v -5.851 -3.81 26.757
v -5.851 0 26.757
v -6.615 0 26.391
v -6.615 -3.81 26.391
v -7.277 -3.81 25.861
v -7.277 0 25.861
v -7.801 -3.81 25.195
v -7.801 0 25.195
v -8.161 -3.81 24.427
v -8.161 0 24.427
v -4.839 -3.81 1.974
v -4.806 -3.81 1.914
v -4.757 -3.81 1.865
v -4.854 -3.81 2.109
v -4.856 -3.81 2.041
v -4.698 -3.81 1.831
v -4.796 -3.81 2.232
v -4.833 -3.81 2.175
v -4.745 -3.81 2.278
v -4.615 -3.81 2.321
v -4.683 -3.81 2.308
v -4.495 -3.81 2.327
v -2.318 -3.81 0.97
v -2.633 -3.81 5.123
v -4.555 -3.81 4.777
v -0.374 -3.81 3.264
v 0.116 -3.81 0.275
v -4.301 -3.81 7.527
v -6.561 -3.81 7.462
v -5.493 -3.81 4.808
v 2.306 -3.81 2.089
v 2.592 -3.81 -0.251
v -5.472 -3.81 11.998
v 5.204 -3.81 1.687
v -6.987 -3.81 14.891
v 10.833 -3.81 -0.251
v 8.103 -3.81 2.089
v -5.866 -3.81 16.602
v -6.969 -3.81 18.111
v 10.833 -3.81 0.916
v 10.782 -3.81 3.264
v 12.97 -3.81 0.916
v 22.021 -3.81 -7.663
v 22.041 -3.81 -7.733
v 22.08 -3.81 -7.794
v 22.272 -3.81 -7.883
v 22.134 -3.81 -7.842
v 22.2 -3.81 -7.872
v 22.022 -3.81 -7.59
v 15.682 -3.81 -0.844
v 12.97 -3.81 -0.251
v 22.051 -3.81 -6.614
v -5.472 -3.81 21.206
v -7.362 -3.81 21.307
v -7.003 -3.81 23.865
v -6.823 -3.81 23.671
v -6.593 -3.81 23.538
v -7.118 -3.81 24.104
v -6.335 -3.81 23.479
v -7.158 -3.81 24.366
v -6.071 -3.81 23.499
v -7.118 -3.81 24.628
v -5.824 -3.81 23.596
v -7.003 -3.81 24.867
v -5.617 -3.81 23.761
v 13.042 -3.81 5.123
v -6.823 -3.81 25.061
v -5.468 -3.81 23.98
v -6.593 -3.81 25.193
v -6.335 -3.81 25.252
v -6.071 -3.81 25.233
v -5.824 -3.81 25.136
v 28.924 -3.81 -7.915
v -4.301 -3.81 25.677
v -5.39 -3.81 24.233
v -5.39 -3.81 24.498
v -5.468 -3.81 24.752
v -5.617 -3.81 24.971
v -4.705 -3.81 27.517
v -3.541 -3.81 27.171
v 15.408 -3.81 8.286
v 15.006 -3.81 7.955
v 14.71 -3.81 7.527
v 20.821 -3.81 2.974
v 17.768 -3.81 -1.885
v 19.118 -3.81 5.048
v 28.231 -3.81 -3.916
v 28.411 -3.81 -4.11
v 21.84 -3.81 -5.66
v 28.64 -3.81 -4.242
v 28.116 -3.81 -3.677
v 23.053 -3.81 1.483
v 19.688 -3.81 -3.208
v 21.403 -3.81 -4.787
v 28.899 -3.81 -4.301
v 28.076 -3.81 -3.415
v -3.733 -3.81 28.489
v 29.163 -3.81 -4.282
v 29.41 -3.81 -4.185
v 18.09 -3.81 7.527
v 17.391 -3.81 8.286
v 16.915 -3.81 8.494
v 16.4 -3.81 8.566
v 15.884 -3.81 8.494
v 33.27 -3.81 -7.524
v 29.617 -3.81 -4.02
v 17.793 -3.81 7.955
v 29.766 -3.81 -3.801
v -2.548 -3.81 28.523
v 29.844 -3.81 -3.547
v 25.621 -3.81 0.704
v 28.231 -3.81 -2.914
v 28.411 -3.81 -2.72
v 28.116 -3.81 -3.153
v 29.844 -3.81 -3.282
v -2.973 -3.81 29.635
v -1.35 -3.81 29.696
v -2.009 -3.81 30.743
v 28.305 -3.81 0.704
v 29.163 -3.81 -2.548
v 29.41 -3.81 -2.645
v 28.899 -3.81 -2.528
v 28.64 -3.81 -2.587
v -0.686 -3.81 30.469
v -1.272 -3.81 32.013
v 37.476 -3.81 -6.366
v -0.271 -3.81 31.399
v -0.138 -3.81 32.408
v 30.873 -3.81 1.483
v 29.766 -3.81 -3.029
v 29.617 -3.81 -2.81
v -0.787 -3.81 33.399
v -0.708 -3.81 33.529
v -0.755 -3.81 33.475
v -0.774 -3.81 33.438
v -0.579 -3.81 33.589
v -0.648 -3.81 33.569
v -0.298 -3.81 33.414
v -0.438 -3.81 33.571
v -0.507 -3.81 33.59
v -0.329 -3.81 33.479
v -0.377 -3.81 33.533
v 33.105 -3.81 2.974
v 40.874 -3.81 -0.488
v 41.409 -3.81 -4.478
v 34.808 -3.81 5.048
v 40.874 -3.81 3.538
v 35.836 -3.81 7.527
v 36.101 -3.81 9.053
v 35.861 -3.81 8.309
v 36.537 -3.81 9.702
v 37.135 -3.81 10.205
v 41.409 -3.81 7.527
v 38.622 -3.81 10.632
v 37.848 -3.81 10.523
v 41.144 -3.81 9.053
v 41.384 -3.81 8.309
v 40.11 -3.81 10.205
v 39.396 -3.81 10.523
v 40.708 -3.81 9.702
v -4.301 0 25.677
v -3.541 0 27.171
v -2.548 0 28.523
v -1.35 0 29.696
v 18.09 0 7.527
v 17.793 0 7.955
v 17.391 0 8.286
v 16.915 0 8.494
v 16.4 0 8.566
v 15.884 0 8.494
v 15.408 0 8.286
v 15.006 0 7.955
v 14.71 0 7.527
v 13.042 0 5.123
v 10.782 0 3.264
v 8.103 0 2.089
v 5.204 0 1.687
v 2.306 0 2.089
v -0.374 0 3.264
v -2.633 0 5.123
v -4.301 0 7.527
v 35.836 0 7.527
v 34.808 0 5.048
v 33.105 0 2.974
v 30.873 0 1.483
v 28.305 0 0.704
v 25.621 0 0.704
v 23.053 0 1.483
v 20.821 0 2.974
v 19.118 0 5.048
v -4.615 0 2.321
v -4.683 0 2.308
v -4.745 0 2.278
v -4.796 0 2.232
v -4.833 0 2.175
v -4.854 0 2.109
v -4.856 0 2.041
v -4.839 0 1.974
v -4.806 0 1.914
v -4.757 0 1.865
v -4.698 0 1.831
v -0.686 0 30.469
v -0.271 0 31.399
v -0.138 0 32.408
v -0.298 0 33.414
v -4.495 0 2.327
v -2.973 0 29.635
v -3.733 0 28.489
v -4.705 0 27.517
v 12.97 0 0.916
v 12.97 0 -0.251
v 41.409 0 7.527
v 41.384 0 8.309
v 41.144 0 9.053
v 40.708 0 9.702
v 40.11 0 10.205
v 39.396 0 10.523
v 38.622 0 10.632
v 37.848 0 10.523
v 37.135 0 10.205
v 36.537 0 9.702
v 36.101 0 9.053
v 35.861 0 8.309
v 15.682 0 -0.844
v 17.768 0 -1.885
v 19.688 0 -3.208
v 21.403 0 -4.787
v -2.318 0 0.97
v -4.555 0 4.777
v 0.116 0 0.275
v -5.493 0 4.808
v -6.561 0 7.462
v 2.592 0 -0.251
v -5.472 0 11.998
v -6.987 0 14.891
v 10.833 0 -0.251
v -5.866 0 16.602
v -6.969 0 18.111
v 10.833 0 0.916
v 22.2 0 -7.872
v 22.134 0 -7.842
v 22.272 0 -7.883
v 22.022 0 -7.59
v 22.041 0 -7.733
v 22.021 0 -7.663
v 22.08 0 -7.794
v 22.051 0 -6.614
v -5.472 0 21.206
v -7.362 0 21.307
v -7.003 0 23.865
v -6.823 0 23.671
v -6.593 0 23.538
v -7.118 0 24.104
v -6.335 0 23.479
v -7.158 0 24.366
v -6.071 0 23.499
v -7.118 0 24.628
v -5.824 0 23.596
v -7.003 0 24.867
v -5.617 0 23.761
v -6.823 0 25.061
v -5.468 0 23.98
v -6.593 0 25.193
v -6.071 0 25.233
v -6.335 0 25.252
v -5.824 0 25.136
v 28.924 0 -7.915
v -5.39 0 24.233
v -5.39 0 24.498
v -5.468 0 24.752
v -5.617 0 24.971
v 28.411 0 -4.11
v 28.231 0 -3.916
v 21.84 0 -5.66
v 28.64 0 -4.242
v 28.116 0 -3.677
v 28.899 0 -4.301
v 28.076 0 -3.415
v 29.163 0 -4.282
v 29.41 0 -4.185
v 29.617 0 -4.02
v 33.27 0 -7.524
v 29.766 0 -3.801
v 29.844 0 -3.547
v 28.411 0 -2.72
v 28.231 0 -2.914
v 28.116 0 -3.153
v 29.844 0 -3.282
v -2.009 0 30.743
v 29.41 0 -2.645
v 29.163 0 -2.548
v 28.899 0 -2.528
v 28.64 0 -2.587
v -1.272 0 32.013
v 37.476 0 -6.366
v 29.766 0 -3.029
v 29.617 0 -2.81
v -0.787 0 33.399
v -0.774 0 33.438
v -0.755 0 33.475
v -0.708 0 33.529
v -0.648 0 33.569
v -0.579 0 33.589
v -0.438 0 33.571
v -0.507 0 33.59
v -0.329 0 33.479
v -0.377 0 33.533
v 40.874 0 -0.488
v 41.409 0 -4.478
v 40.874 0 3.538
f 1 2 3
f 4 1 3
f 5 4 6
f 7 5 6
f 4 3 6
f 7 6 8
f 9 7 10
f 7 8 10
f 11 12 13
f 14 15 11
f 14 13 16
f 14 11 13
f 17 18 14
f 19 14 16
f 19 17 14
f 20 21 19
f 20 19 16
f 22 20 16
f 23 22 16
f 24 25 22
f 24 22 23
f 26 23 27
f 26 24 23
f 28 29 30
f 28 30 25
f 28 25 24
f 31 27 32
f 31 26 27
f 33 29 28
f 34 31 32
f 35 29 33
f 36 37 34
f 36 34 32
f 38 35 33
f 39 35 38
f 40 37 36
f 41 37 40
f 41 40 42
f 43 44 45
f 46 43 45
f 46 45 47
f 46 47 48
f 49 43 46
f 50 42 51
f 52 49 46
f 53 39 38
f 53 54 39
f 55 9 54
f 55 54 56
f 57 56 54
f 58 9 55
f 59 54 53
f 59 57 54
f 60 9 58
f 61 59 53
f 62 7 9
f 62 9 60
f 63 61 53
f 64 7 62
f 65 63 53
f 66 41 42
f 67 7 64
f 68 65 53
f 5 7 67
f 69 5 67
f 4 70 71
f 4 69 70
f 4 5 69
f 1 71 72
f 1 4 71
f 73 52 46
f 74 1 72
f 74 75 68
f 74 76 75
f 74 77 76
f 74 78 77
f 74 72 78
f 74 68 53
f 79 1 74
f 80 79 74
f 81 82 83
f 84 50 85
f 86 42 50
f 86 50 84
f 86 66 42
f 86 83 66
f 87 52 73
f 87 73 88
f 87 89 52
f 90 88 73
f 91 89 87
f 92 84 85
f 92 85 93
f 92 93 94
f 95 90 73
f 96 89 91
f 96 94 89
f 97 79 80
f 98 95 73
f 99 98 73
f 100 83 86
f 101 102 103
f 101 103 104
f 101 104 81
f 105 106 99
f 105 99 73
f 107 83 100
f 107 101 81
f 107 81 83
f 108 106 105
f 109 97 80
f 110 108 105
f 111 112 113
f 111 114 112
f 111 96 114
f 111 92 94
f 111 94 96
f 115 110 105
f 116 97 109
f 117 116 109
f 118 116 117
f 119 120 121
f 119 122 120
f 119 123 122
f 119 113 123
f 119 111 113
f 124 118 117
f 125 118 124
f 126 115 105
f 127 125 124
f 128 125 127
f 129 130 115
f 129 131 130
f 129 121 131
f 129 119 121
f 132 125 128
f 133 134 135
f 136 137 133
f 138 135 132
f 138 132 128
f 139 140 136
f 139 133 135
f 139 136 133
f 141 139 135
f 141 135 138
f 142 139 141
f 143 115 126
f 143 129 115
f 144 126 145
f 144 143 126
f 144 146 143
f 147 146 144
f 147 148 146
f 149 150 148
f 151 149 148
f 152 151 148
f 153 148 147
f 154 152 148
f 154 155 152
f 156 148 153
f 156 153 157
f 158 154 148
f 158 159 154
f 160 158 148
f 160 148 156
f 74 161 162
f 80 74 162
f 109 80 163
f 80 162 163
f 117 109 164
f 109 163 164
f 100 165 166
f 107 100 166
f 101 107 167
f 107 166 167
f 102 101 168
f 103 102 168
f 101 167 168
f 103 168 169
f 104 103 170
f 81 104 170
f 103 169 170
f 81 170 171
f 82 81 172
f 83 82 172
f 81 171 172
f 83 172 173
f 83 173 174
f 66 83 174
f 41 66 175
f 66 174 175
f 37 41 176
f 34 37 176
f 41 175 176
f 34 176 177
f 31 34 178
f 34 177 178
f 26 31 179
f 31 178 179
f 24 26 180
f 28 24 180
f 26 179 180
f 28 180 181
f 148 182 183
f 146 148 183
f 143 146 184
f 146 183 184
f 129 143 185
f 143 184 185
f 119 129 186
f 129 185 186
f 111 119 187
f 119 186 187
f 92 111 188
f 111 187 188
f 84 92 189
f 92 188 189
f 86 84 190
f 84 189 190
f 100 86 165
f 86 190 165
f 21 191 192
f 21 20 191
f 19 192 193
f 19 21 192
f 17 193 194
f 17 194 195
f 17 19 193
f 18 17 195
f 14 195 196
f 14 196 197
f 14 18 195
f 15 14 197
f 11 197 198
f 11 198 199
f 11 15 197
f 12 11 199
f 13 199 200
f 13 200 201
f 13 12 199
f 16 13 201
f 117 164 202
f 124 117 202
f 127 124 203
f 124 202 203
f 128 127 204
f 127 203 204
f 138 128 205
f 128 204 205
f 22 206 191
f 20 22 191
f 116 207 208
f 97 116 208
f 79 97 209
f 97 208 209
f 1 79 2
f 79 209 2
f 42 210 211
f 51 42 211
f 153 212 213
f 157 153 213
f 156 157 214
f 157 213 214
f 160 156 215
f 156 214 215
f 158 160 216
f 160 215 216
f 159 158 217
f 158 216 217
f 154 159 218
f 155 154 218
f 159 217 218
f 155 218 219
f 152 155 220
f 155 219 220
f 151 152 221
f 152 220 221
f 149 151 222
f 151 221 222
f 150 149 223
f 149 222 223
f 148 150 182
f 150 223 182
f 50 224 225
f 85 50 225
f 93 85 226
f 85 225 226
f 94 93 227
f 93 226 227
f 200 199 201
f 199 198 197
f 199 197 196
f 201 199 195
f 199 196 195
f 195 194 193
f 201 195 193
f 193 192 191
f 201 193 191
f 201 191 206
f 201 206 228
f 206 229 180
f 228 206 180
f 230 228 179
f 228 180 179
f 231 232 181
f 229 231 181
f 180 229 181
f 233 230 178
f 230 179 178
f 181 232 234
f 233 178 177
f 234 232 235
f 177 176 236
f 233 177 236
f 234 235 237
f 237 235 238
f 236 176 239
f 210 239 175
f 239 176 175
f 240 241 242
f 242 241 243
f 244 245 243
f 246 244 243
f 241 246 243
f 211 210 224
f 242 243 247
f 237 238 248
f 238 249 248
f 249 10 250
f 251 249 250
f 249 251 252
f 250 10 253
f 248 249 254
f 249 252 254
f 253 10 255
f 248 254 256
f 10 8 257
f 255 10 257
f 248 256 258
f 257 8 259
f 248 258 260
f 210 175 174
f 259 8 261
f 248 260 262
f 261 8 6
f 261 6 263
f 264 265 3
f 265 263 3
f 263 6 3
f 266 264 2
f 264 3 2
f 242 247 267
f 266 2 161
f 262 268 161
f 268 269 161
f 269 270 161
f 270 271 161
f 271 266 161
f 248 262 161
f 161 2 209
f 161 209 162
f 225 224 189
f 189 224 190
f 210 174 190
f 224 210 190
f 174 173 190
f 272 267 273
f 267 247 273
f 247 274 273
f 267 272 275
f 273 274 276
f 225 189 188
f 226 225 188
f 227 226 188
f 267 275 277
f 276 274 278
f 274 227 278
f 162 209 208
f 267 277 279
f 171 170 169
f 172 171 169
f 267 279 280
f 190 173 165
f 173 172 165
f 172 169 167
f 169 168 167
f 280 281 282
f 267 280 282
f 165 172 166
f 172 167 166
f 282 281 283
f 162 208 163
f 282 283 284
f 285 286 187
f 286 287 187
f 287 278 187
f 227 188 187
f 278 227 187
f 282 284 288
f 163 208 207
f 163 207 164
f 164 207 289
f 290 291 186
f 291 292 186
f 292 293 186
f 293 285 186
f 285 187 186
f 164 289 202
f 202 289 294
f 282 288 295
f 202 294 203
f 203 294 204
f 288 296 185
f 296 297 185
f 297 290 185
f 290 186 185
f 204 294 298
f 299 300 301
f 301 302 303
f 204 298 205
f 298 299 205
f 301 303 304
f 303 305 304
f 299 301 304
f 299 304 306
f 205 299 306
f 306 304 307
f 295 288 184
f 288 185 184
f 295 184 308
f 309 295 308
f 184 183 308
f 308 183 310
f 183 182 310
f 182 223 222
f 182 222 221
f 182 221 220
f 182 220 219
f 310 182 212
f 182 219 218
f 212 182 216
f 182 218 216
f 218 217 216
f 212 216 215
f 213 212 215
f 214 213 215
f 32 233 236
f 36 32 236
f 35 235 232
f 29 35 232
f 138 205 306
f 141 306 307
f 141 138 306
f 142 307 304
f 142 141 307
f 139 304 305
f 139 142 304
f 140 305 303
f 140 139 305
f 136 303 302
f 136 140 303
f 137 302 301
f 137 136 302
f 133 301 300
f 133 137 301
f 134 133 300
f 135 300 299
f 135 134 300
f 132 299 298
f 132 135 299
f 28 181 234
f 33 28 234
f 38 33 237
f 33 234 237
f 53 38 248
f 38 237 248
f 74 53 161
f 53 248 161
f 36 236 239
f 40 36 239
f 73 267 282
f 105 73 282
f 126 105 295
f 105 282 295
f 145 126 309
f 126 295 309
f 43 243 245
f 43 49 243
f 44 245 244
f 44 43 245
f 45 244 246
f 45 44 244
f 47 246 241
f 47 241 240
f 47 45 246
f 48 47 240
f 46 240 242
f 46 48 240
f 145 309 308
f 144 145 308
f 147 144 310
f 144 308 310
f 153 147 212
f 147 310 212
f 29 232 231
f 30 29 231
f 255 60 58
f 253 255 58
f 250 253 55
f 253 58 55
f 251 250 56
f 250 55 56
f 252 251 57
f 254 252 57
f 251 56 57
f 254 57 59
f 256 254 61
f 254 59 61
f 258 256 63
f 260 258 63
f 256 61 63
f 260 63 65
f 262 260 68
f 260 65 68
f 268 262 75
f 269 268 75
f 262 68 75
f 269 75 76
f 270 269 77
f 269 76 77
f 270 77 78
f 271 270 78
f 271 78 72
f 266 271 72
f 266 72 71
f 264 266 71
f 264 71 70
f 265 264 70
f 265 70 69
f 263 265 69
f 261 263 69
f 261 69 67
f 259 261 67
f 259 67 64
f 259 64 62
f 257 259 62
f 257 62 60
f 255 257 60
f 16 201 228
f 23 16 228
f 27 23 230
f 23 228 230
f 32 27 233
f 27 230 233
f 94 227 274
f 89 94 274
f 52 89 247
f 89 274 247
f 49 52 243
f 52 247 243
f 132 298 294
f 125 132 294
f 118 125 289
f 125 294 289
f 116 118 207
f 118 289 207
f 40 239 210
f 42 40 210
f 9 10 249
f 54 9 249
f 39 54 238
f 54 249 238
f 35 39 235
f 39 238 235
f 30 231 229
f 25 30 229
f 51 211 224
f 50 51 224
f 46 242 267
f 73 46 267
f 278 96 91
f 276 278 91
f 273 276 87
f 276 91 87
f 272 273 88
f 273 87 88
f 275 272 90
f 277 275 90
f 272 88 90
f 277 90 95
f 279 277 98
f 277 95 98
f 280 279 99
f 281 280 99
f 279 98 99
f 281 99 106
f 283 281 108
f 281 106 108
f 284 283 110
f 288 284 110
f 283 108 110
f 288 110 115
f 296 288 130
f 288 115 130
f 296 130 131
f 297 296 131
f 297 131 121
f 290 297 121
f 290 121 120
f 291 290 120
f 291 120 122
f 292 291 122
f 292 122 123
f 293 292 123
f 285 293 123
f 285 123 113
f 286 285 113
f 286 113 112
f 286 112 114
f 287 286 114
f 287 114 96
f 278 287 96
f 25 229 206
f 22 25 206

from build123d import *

# Parameters (mm, degrees)
F1_DEPTH = 3.81
F2_R     = 0.254
F3_D     = 1.778


# Not quite as in the source:
# - a feature names something its author has since deleted; it is built from what else it names


with BuildPart() as f1:
    # F0 (on Front) → F1 (new body)
    with BuildSketch(Plane.XZ):
        with BuildLine():
            ThreePointArc((41.4086468518, -4.477661373), (40.8064485211, 1.5249027452), (41.4086468518, 7.5274668634))
            ThreePointArc((41.4086468518, 7.5274668634), (38.62243375, 10.6323405578), (35.8362206482, 7.5274668634))
            ThreePointArc((35.8362206482, 7.5274668634), (26.9629642945, 0.6052852493), (18.0897079408, 7.5274668634))
            ThreePointArc((18.0897079408, 7.5274668634), (16.3997087002, 8.5658356165), (14.7097094595, 7.5274668634))
            ThreePointArc((14.7097094595, 7.5274668634), (5.20431123, 1.6871633473), (-4.3010869995, 7.5274668634))
            ThreePointArc((-4.3010869995, 7.5274668634), (-5.8660457098, 16.6021063924), (-4.3010869995, 25.6767459214))
            ThreePointArc((-4.3010869995, 25.6767459214), (-3.0718420066, 27.8672574596), (-1.3499599881, 29.6960566193))
            ThreePointArc((-1.3499599881, 29.6960566193), (-0.1811880249, 31.805372823), (-0.6376186502, 34.1732650995))
            ThreePointArc((-0.6376186502, 34.1732650995), (-1.421034245, 31.7066061173), (-2.9725597706, 29.6351537108))
            ThreePointArc((-2.9725597706, 29.6351537108), (-4.1943946694, 27.9789305778), (-5.8506173082, 26.7570950091))
            ThreePointArc((-5.8506173082, 26.7570950091), (-7.277149178, 25.8612568479), (-8.1605734304, 24.4270041585))
            ThreePointArc((-8.1605734304, 24.4270041585), (-7.1141917577, 19.7155957013), (-6.9871647283, 14.8910596211))
            Line((-6.9871647283, 14.8910596211), (-6.5609117303, 7.4617798516))
            Line((-6.5609117303, 7.4617798516), (-5.4928543977, 4.8075970262))
            Line((-5.4928543977, 4.8075970262), (-4.555047024, 4.7773430124))
            Line((-4.555047024, 4.7773430124), (-4.4945431873, 2.3267425131))
            Line((-4.4945431873, 2.3267425131), (-5.734869279, 2.2662337869))
            ThreePointArc((-5.734869279, 2.2662337869), (-1.646496666, 0.760301383), (2.5915002188, -0.2506414603))
            Line((2.5915002188, -0.2506414603), (10.8333304524, -0.2506414603))
            Line((10.8333304524, -0.2506414603), (10.8333304524, 0.9162292117))
            Line((10.8333304524, 0.9162292117), (12.9701783881, 0.9162292117))
            Line((12.9701783881, 0.9162292117), (12.9701783881, -0.2506414603))
            Line((12.9701783881, -0.2506414603), (15.6823657453, -0.8442893741))
            ThreePointArc((15.6823657453, -0.8442893741), (18.751499307, -2.5127162084), (21.4028581977, -4.7872546129))
            ThreePointArc((21.4028581977, -4.7872546129), (22.004430538, -6.2762052491), (21.9660382718, -7.8816302121))
            Line((21.9660382718, -7.8816302121), (28.9244800806, -7.9146586359))
            ThreePointArc((28.9244800806, -7.9146586359), (35.3988018628, -7.0397169385), (41.4086468518, -4.477661373))
        make_face()
    extrude(amount=F1_DEPTH)

    # F2
    f2_edges = [f1.edges().sort_by_distance(p)[0] for p in [
        (-0.637619, -1.905, 34.173265),
        (21.966038, -1.905, -7.88163),
        (-5.734869, -1.905, 2.266234),
    ]]
    fillet(f2_edges, radius=F2_R)

    # F3 (through all)
    with Locations(Plane(origin=(0, 0, 0), x_dir=(1, 0, 0), z_dir=(0, 1, 0))):
        with Locations((28.9652328938, 3.4148474224), (-6.2686339952, -24.3659485132)):
            Hole(F3_D / 2)


solid = f1.part
